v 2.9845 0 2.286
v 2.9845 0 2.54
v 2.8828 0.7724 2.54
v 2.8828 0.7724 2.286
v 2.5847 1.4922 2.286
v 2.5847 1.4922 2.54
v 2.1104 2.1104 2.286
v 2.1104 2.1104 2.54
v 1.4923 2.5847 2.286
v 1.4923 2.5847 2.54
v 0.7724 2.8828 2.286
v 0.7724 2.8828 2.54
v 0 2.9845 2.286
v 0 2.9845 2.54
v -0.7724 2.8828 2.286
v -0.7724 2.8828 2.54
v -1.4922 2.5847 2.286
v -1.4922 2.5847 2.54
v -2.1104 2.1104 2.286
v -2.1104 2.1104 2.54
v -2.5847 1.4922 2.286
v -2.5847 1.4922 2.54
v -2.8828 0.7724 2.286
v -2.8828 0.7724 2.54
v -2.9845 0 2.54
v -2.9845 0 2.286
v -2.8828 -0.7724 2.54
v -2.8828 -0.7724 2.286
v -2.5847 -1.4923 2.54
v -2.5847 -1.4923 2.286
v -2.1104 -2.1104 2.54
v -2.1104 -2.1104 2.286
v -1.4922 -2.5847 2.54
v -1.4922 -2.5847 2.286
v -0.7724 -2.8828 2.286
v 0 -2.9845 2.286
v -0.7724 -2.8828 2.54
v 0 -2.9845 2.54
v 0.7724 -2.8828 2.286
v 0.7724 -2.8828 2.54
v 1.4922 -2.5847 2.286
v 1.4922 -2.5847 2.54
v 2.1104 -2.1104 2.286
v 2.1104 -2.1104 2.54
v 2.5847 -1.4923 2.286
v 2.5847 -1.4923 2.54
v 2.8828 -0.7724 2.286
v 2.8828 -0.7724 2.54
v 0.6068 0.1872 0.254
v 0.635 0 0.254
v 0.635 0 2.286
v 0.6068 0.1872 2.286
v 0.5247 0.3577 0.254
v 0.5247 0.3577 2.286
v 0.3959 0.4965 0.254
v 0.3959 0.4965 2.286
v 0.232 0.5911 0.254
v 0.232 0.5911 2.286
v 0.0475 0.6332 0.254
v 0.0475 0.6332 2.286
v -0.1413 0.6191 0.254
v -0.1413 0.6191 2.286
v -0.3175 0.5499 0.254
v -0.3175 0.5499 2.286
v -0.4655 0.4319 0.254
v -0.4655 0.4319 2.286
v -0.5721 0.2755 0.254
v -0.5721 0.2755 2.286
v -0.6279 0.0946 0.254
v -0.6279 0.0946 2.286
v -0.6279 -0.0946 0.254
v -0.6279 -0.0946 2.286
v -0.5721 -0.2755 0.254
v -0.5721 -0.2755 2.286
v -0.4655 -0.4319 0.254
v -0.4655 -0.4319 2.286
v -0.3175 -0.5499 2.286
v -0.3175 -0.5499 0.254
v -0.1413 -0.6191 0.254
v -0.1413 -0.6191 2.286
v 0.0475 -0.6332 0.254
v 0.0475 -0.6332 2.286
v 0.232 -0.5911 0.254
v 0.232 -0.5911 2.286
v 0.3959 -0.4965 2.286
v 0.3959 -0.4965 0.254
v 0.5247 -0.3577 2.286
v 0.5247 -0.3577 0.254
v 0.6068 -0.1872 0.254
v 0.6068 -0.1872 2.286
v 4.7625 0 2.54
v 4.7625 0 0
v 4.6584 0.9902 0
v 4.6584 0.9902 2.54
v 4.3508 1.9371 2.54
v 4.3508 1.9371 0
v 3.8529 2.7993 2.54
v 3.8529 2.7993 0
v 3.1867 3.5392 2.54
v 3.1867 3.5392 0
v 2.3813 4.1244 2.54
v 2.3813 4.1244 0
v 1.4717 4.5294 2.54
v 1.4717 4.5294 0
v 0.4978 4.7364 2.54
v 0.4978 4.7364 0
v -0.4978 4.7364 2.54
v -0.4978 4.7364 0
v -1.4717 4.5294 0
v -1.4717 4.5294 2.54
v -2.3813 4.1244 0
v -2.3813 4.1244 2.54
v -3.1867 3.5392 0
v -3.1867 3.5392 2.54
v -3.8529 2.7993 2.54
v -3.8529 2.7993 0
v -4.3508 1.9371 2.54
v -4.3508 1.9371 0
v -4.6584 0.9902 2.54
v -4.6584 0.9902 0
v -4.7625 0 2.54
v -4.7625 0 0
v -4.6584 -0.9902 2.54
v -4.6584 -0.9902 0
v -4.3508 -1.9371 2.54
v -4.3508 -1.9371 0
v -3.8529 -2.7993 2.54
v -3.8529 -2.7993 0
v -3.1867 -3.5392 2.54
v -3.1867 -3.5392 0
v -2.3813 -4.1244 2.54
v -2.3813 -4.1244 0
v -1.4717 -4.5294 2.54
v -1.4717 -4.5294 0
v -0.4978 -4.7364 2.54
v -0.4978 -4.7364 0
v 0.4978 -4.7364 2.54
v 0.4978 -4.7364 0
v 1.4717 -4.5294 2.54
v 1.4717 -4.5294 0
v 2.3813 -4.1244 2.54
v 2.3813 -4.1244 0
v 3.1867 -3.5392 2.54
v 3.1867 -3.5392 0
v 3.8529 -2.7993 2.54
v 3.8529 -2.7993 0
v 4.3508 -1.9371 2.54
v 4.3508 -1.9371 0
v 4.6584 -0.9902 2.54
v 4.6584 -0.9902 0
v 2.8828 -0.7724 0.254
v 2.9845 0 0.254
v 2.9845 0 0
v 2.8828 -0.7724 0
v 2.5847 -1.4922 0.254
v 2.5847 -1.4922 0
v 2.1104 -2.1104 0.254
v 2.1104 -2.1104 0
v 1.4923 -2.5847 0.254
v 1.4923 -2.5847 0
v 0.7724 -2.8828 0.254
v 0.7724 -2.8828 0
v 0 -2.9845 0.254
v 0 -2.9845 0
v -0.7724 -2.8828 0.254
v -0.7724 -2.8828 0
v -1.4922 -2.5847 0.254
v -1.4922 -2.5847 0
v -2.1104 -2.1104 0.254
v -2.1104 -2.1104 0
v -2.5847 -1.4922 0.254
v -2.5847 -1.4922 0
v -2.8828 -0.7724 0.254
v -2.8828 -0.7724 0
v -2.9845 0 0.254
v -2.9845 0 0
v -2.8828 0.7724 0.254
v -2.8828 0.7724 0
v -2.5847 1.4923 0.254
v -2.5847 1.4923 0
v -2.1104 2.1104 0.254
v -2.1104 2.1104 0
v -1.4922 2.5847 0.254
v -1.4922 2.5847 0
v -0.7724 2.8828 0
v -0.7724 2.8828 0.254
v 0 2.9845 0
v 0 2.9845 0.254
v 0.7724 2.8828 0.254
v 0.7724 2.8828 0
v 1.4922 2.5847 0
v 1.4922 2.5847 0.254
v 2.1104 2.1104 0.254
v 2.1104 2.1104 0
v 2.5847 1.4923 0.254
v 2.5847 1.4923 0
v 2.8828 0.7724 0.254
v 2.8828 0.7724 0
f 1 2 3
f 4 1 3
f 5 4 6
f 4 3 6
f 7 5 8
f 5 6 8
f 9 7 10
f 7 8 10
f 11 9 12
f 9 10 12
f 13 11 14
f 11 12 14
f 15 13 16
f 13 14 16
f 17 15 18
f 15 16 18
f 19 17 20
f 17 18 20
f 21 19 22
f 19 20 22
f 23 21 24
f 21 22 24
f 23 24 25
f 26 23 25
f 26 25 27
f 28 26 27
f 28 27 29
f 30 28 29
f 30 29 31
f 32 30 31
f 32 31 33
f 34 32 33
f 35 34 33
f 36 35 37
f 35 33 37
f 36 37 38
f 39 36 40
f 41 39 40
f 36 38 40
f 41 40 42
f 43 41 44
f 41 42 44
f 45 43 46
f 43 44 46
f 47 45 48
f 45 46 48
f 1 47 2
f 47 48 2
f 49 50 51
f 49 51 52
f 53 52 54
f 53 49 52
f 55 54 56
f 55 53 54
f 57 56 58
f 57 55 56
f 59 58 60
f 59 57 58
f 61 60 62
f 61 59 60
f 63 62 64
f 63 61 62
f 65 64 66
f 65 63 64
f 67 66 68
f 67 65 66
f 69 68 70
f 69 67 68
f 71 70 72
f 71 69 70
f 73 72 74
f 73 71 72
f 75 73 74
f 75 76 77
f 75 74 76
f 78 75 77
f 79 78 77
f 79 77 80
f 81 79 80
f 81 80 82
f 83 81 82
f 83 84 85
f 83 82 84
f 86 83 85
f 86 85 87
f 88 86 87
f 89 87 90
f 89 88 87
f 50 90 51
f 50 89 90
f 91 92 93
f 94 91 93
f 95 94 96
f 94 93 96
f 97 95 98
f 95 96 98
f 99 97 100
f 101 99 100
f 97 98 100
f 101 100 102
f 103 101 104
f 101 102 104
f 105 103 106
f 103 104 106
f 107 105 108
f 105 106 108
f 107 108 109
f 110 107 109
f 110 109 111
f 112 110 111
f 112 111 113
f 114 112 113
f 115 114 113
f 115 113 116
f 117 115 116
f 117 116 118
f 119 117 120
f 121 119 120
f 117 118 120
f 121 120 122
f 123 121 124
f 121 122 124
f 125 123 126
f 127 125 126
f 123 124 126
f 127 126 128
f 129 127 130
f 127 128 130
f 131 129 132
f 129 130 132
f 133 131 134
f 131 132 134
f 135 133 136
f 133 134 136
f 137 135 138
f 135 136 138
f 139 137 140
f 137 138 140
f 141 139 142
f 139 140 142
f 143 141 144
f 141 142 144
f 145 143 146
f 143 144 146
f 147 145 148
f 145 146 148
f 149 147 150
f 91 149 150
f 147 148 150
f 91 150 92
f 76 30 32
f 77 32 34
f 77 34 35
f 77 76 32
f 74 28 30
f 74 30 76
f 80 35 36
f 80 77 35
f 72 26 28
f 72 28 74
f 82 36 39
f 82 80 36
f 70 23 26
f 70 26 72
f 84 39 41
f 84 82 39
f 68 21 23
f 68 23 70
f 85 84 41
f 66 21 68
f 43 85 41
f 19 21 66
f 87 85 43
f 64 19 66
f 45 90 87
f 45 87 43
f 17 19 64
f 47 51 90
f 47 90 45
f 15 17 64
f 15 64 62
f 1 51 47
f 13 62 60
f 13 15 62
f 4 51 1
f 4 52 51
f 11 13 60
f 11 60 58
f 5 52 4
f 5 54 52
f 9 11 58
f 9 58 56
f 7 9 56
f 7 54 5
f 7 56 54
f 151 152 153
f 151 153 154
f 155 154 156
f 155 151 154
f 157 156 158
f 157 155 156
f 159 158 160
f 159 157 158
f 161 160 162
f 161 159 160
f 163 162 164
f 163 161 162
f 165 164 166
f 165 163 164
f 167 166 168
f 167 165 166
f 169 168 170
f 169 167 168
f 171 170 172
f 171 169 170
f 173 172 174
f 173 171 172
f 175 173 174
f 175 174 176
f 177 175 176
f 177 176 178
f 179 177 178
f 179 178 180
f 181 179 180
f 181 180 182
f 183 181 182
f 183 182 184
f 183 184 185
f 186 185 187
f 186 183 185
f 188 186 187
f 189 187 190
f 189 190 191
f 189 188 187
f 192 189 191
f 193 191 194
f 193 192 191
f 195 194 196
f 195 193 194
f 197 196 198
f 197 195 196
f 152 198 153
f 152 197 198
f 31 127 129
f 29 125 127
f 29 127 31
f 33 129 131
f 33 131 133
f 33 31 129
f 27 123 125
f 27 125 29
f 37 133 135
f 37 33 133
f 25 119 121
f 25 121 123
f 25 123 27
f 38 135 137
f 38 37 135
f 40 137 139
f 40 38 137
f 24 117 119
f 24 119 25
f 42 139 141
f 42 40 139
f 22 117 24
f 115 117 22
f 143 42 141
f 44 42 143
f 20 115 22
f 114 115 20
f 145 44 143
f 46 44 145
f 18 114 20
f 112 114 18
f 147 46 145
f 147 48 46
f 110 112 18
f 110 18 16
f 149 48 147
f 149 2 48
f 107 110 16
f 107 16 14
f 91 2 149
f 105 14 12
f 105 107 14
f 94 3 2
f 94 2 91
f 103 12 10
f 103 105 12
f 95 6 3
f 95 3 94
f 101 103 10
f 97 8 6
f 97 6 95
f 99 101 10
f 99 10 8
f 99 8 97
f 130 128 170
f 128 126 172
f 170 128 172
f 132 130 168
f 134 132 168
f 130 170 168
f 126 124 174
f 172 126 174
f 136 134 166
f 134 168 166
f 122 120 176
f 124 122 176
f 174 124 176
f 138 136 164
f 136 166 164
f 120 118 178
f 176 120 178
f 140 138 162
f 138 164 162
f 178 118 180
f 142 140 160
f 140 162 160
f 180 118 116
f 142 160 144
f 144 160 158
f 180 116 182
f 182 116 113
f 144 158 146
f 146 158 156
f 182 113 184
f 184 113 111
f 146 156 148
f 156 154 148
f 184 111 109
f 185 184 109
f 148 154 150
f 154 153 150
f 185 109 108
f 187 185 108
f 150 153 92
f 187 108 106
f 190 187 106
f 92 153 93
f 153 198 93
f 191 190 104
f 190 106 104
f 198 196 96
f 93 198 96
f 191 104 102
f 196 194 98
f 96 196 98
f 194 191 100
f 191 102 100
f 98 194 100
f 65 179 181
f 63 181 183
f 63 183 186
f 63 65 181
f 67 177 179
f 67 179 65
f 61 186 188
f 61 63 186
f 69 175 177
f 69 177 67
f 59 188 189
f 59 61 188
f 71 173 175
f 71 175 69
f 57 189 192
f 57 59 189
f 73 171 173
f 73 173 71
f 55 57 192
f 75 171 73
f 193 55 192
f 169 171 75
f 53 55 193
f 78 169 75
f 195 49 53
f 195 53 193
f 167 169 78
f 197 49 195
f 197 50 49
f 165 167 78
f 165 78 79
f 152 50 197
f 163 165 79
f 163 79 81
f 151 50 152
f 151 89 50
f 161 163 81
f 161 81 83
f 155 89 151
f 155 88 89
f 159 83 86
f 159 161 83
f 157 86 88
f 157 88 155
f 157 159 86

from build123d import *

# Parameters (mm, degrees)
SKETCH1_R           = 4.7625
SKETCH1_R_2         = 0.635
BOSS_EXTRUDE1_DEPTH = 2.54
SKETCH2_R           = 2.9845
CUT_EXTRUDE1_DEPTH  = 0.254
CUT_EXTRUDE2_START  = -0.254
SKETCH3_R           = 2.9845
CUT_EXTRUDE2_DEPTH  = 0.254


with BuildPart() as part:
    # Sketch1 → Boss-Extrude1 (new body)
    with BuildSketch(Plane.XY):
        Circle(SKETCH1_R)
        Circle(SKETCH1_R_2, mode=Mode.SUBTRACT)
    extrude(amount=BOSS_EXTRUDE1_DEPTH)

    # Sketch2 → Cut-Extrude1 (cut)
    with BuildSketch(Plane.XY.offset(2.54)):
        Circle(SKETCH2_R)
    extrude(amount=-CUT_EXTRUDE1_DEPTH, mode=Mode.SUBTRACT)

    # Sketch3 → Cut-Extrude2 (cut)
    with BuildSketch(Plane(origin=(0, 0, 0), x_dir=(-1, 0, 0), z_dir=(0, 0, -1)).offset(CUT_EXTRUDE2_START)):
        with Locations(Location((0, 0, 0), (0, 0, 180))):
            Circle(SKETCH3_R)
    extrude(amount=CUT_EXTRUDE2_DEPTH, mode=Mode.SUBTRACT)


solid = part.part
